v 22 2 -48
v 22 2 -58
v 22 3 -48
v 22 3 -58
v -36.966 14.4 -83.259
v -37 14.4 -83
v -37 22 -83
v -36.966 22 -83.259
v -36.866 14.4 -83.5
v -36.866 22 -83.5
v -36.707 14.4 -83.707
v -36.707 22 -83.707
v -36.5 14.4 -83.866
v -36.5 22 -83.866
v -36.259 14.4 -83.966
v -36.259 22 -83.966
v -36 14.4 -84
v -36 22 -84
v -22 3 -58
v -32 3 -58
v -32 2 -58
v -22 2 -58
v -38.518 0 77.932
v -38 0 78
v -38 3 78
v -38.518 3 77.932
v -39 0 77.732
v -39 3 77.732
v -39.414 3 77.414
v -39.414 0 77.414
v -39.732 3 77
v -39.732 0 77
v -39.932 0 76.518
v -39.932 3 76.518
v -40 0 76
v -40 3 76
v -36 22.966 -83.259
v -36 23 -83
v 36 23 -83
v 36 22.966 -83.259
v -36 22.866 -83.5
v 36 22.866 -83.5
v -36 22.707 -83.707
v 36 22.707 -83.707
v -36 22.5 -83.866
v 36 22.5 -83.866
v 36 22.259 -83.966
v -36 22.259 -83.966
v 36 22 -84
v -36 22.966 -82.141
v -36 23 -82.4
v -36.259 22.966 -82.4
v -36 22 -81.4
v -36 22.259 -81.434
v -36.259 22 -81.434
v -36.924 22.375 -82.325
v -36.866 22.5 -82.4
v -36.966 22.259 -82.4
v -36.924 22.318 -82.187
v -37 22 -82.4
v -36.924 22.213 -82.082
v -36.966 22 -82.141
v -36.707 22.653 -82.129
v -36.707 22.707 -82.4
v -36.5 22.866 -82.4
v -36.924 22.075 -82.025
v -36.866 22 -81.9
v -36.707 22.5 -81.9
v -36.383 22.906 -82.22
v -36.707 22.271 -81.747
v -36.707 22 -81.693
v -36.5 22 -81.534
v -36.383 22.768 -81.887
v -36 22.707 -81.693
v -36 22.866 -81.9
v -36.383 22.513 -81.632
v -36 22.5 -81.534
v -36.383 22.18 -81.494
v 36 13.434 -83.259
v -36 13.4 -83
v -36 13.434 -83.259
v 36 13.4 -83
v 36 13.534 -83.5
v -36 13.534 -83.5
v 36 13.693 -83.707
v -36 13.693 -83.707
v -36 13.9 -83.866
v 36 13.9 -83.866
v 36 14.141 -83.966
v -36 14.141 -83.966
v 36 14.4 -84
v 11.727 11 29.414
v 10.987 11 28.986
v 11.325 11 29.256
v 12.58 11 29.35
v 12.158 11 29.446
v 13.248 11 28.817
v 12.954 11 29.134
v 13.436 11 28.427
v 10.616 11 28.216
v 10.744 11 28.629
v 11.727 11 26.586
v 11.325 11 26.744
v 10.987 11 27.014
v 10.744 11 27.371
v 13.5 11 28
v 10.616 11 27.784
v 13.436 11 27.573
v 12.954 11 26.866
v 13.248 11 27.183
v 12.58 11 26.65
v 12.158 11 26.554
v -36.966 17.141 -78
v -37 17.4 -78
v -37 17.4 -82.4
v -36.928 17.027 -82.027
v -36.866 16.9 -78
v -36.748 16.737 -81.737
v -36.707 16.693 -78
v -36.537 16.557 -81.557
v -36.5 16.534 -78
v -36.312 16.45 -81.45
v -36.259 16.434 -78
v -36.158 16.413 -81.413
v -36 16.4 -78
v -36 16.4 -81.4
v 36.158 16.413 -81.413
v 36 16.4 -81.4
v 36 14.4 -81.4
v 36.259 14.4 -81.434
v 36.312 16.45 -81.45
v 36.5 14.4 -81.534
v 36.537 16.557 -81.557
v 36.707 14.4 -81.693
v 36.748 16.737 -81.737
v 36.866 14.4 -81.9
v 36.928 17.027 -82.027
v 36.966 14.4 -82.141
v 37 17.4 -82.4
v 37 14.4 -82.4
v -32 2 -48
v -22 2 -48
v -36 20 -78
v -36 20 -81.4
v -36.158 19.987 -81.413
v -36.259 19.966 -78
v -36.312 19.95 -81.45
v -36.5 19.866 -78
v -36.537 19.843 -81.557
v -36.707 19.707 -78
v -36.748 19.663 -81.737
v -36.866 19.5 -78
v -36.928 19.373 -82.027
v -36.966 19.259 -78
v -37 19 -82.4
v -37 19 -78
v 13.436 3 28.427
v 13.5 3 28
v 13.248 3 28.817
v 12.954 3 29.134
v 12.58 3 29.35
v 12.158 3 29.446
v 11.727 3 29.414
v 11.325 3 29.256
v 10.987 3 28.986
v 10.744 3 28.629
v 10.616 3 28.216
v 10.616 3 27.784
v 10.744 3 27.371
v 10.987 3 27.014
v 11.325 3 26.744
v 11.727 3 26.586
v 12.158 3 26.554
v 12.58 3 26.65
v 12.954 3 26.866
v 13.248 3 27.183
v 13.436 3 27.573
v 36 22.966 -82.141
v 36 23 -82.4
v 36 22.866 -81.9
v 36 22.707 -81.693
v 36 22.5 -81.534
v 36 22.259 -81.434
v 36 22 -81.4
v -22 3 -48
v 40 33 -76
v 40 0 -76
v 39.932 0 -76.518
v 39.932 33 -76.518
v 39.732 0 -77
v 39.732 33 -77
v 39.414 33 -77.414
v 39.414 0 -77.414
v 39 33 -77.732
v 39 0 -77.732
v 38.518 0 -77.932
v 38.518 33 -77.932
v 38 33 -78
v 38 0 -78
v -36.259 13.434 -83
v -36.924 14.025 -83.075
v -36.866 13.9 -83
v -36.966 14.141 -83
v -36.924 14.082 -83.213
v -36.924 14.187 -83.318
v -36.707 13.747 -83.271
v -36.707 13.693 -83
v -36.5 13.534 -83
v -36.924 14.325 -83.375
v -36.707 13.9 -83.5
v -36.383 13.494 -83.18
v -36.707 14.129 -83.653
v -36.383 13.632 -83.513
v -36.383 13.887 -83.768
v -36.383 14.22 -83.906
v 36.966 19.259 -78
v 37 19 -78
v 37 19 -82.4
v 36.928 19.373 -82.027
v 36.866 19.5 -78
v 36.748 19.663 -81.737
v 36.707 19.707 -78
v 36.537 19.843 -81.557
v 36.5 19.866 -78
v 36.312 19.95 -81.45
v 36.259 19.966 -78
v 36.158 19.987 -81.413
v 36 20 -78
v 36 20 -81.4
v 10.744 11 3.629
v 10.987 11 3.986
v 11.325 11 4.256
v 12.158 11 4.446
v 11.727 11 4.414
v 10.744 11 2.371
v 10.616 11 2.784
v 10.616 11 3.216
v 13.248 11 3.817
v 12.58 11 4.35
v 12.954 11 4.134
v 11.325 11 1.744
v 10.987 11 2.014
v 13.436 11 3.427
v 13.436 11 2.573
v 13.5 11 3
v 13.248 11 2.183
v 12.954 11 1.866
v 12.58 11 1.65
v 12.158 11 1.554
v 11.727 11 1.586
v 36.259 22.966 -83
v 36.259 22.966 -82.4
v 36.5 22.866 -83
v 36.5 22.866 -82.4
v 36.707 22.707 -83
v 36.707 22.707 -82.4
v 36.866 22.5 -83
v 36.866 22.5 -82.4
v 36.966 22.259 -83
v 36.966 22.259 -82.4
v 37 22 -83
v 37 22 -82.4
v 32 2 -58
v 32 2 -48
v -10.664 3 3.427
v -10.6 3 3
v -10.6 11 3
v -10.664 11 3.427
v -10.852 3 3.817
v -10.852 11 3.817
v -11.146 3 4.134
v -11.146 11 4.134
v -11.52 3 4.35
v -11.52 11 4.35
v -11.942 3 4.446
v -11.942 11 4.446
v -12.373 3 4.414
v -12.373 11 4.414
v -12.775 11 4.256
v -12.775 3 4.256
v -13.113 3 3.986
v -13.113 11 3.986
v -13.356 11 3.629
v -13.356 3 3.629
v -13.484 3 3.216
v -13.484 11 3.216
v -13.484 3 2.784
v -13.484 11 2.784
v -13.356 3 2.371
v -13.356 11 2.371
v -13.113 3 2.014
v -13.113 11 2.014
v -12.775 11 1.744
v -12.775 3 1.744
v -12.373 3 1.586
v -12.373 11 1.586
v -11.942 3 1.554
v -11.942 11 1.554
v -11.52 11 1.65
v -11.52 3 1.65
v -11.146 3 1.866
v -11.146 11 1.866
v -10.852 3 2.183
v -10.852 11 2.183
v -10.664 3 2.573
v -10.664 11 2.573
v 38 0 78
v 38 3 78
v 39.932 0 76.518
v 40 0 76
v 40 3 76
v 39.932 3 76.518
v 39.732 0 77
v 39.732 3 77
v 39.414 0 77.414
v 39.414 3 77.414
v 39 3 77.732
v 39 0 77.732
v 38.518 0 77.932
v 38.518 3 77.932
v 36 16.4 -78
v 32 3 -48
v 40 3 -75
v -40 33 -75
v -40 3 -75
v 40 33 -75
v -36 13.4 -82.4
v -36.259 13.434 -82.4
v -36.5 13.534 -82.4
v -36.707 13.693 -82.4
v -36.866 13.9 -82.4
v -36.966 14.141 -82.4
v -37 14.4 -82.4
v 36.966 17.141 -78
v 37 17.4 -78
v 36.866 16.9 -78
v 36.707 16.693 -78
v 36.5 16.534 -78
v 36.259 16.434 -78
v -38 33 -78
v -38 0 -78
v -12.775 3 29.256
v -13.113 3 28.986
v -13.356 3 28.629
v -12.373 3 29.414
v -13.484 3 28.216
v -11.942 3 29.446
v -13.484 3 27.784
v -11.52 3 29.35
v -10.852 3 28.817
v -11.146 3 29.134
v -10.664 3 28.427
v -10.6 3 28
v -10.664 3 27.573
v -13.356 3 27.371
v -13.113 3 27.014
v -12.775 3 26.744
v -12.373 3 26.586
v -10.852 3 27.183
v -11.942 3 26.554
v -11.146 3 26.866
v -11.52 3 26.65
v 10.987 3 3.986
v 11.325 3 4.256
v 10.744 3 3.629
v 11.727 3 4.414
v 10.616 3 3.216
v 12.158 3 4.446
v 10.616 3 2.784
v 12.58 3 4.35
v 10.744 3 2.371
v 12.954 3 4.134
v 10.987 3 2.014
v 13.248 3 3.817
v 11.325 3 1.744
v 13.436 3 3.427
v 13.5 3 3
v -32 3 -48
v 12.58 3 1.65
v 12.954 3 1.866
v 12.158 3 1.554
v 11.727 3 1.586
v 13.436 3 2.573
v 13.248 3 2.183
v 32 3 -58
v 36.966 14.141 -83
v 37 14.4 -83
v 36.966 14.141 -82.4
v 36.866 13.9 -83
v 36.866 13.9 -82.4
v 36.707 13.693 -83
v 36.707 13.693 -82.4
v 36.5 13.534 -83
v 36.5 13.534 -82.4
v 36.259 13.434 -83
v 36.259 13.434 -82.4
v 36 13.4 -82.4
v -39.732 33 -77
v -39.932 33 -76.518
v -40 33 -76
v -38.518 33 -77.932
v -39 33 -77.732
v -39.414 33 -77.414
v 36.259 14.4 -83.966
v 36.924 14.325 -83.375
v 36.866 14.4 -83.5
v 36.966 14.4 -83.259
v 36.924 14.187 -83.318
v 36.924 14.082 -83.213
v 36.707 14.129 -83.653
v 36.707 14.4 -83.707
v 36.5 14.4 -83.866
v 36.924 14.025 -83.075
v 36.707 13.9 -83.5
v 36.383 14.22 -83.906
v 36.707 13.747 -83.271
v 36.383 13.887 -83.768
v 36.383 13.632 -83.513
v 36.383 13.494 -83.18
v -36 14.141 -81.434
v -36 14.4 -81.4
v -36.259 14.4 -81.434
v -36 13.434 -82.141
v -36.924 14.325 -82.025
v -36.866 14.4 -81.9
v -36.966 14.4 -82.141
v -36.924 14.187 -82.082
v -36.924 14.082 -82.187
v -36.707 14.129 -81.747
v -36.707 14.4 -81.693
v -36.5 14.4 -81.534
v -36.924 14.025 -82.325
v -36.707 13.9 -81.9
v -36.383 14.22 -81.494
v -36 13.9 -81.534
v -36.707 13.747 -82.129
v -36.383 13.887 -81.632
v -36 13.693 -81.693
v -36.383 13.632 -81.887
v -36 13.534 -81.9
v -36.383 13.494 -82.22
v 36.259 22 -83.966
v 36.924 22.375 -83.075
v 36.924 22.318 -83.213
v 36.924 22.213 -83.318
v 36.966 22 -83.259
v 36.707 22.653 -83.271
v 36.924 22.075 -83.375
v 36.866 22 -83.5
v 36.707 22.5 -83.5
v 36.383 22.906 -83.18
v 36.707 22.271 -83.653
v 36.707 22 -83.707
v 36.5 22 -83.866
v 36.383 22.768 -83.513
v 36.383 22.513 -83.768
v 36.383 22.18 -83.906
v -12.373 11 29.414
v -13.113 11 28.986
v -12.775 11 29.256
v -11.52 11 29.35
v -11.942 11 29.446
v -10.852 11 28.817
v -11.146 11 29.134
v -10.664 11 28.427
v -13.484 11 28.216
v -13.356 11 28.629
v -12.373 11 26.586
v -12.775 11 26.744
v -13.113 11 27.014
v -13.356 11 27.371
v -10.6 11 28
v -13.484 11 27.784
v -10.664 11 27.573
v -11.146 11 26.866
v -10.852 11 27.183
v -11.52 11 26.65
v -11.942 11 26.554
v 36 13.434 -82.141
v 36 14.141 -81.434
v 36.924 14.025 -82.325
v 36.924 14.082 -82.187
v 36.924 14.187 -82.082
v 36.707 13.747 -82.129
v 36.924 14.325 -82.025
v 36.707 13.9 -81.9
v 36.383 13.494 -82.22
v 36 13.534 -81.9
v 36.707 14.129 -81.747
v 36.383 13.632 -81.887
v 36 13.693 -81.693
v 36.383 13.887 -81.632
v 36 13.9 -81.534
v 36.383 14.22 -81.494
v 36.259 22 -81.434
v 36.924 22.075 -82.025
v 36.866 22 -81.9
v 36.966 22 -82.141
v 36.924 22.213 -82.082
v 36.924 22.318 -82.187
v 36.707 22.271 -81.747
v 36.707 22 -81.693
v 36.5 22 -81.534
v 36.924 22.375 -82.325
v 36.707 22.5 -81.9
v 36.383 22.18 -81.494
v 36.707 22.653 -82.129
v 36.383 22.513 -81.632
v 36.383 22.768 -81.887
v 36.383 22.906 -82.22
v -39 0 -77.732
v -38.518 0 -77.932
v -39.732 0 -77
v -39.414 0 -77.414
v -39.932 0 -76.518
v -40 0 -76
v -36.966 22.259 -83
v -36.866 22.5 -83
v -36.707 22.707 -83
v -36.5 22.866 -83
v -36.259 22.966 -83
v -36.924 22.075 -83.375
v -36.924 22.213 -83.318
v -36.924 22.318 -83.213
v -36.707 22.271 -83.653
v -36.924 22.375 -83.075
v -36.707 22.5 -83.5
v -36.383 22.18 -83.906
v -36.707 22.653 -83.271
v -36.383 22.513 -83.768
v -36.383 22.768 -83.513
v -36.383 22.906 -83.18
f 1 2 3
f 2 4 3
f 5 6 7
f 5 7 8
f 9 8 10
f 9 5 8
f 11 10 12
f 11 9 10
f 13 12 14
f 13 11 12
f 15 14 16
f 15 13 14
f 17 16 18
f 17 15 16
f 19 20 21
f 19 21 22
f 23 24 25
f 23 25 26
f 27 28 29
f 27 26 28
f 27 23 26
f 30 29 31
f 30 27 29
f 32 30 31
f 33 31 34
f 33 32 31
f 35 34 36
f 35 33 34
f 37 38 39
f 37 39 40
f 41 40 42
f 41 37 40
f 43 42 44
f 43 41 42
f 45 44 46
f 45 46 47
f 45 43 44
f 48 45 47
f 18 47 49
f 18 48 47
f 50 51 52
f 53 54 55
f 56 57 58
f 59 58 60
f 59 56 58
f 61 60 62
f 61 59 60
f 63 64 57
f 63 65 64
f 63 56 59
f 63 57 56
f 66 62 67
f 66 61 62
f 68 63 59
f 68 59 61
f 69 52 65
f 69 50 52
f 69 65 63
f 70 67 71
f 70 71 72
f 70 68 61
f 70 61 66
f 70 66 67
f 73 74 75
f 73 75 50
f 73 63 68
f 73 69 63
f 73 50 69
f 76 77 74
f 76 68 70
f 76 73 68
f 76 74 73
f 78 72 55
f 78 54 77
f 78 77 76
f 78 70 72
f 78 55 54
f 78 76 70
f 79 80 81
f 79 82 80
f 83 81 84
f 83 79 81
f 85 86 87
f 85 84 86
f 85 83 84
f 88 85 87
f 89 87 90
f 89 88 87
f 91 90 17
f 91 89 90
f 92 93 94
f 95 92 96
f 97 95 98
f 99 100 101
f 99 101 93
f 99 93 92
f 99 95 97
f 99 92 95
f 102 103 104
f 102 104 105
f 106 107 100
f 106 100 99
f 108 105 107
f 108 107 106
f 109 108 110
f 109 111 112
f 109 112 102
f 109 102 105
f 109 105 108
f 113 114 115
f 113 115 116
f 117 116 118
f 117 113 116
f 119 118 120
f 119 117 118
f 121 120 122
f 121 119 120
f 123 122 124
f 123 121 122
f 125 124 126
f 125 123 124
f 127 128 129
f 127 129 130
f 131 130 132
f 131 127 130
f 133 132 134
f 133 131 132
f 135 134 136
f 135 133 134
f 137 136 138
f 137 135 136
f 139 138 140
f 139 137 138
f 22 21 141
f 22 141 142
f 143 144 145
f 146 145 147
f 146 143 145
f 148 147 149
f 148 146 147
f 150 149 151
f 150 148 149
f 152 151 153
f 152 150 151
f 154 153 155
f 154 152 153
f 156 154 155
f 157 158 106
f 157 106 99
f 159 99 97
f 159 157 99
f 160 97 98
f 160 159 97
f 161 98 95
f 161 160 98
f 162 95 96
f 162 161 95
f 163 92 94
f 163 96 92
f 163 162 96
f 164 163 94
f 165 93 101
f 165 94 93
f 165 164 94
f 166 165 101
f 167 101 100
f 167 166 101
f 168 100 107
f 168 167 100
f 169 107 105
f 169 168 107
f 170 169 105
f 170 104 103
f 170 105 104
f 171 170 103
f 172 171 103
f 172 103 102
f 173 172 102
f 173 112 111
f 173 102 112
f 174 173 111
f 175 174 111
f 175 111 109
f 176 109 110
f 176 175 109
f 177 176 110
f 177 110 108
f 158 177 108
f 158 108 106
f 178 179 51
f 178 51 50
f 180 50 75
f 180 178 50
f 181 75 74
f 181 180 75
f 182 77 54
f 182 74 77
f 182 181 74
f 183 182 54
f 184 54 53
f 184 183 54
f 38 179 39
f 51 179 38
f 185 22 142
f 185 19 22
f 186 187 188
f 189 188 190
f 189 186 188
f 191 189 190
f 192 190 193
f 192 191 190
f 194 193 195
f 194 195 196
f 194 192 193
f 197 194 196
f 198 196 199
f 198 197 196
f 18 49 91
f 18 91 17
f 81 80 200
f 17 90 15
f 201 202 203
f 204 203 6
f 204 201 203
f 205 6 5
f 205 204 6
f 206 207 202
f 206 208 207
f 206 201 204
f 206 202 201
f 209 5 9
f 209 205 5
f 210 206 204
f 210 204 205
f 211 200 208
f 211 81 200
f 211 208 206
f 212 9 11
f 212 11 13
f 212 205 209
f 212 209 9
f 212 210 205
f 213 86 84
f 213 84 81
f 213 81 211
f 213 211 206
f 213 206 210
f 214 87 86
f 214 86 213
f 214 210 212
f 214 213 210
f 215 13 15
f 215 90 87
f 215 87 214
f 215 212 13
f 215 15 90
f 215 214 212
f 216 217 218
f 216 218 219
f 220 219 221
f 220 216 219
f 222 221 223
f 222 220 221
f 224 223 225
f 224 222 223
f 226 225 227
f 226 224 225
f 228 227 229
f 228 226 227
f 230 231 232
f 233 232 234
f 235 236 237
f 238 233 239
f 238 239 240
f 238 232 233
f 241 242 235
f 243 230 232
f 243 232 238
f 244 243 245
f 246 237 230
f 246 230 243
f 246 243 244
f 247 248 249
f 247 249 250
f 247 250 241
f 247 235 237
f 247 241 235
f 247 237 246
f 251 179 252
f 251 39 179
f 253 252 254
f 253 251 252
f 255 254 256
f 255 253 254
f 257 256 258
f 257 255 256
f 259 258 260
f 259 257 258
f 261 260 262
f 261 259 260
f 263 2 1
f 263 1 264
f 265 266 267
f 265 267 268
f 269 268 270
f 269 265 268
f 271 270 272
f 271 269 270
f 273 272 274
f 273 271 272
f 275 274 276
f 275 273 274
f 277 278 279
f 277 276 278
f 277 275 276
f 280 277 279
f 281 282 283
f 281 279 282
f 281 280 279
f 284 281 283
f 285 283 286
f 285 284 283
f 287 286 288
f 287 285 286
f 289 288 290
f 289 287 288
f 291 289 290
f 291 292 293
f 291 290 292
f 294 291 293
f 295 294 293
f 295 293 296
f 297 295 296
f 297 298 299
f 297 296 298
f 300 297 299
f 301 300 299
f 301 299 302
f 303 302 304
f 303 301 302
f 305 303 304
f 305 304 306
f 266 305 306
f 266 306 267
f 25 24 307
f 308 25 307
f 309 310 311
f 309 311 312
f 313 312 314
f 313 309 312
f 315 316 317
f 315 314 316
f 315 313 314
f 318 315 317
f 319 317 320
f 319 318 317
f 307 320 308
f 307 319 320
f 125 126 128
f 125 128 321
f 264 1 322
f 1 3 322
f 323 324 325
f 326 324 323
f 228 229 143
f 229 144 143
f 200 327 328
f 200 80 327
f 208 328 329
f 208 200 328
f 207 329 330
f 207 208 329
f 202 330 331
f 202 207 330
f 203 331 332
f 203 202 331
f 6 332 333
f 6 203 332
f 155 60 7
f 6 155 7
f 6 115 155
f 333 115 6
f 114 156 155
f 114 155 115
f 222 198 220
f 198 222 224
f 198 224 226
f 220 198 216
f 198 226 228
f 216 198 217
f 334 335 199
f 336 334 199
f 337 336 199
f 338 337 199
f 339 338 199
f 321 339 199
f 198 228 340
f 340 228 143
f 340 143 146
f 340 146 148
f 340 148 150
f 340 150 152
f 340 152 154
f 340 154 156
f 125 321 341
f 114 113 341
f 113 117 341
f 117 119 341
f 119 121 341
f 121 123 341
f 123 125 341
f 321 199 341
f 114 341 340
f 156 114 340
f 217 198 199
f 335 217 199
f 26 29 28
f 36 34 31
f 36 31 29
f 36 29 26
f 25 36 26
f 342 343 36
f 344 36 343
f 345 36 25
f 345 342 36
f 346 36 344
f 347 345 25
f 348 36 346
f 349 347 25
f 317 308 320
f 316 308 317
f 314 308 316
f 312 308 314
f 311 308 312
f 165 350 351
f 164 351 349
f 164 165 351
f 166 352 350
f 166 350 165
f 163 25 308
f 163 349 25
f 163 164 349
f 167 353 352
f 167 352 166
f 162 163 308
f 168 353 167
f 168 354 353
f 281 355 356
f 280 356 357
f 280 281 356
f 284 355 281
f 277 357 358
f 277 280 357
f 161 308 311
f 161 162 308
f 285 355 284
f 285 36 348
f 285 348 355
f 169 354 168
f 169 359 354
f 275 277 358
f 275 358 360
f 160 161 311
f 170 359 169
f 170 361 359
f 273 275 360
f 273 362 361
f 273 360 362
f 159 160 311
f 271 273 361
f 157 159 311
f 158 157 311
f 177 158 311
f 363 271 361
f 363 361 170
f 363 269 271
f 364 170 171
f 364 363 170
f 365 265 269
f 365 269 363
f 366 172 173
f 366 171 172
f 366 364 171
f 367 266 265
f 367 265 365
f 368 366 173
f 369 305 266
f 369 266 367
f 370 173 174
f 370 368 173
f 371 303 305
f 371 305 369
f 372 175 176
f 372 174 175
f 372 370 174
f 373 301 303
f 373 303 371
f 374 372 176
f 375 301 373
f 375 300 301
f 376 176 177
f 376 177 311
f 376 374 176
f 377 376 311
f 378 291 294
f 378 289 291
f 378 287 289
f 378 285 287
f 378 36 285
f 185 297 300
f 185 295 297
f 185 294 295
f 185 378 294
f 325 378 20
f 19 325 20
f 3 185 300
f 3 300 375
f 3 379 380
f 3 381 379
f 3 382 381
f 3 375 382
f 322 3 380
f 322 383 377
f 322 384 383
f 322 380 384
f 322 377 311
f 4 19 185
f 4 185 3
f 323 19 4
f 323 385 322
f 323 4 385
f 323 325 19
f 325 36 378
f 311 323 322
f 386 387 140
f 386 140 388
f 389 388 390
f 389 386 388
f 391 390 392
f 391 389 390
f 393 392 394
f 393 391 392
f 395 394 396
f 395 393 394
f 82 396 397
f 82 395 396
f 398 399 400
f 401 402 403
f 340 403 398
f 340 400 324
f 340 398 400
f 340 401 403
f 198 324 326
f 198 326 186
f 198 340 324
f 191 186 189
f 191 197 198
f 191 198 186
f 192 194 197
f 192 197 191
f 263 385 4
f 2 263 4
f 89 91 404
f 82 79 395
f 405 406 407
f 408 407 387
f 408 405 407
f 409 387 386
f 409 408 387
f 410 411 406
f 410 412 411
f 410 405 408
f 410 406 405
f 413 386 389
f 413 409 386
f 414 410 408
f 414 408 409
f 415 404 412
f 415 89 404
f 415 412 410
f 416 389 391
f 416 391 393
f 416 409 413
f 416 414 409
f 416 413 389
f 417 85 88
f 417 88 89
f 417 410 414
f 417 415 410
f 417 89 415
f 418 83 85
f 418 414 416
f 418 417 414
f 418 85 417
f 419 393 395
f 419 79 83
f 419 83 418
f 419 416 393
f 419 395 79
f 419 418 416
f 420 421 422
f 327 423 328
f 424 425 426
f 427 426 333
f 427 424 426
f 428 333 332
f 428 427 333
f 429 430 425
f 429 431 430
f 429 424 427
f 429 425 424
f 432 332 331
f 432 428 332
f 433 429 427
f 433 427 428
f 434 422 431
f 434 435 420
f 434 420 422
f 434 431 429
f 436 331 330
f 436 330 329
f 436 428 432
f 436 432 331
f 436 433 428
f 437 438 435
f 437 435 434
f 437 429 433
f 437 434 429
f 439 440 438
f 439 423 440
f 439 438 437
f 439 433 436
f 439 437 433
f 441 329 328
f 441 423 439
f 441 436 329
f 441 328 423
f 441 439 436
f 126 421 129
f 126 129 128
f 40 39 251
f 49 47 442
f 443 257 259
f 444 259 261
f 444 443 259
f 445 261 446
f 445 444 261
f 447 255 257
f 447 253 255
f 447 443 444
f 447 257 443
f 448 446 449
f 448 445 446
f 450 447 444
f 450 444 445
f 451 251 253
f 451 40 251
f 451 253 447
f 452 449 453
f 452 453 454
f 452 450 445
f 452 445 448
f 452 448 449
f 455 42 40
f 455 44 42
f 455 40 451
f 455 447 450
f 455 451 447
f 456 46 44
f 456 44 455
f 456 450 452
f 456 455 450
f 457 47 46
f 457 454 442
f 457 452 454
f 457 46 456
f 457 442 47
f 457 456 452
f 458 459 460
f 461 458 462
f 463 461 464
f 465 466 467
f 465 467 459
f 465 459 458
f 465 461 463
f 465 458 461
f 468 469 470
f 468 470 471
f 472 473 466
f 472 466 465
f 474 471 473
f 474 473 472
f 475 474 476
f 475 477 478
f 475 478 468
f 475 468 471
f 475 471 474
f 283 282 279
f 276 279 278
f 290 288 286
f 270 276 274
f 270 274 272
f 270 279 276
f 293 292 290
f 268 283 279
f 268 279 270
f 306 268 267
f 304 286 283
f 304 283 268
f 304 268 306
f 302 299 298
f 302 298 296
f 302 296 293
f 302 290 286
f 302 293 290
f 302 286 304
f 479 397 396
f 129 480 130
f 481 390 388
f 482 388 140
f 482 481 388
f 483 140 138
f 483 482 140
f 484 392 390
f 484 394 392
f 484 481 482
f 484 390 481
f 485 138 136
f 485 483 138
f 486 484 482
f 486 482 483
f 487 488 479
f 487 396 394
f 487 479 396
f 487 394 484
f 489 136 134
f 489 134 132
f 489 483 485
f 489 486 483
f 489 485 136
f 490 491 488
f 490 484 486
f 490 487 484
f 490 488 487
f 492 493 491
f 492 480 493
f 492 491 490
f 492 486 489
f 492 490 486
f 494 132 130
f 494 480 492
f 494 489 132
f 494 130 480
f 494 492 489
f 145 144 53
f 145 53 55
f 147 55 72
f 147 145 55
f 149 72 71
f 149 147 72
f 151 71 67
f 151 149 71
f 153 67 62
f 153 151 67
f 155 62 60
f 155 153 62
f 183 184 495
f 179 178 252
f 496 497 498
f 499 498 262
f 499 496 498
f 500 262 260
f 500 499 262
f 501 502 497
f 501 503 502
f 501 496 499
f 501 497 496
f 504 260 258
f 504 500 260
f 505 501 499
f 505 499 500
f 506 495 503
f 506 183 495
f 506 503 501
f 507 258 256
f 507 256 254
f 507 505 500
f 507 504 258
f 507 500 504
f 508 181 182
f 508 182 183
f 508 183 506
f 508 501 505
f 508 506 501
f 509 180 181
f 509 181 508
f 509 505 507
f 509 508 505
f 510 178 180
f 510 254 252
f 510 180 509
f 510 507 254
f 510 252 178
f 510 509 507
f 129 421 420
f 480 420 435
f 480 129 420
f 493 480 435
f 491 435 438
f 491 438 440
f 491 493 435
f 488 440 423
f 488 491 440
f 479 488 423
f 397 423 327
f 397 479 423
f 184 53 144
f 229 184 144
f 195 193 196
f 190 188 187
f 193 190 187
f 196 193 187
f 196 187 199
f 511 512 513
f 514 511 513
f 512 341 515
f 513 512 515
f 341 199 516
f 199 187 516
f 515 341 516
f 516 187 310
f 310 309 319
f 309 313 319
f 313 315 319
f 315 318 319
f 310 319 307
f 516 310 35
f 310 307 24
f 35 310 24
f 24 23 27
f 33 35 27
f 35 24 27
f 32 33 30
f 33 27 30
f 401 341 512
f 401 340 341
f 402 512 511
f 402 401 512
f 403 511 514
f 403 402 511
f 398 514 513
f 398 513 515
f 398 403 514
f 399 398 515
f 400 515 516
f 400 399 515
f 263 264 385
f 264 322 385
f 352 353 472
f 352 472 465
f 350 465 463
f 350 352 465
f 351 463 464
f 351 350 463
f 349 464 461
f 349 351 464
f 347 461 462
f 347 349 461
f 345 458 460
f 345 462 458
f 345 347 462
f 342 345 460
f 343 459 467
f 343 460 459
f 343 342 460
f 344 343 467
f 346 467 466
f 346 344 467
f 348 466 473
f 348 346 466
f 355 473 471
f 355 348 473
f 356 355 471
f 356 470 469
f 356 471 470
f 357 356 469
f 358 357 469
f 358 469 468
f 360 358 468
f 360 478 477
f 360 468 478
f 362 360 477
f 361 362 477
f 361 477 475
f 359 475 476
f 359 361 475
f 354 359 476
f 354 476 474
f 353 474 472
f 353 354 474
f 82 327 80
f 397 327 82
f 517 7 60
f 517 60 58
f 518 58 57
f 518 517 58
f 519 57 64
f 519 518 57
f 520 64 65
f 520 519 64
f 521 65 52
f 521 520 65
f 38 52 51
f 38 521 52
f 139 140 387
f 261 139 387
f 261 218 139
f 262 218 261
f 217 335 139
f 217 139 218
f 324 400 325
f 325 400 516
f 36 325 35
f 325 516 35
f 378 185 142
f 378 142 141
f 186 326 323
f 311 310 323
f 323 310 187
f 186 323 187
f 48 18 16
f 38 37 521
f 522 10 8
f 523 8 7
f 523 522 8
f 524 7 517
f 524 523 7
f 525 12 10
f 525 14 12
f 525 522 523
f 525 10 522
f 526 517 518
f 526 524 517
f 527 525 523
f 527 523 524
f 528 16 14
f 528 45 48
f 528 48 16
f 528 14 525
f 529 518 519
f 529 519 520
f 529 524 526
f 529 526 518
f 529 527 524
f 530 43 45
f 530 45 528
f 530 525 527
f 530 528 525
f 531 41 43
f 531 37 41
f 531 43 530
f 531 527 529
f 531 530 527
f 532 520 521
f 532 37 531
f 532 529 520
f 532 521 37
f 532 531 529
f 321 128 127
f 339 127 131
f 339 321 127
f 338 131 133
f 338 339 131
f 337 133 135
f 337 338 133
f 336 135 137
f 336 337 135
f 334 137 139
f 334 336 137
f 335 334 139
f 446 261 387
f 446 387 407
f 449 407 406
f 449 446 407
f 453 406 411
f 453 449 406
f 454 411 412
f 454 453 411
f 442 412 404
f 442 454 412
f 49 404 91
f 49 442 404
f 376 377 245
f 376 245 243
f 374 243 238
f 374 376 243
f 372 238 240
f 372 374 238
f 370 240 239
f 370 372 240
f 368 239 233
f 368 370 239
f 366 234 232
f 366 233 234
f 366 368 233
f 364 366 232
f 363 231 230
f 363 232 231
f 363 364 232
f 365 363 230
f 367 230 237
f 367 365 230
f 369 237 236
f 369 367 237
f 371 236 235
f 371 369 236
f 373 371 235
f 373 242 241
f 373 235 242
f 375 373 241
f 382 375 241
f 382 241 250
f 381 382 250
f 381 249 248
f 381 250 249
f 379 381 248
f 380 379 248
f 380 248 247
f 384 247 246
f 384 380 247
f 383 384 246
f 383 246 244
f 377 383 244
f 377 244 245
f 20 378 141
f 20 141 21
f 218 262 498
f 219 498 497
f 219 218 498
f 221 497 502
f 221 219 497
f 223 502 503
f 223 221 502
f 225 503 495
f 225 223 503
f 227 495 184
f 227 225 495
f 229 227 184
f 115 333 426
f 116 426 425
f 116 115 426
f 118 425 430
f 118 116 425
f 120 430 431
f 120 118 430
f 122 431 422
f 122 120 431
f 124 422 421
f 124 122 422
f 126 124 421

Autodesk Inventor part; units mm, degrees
ref_plane "YZ Plane" through (0, 0, 0) normal (1, 0, 0) x (0, 1, 0)
ref_plane "XZ Plane" through (0, 0, 0) normal (0, 1, 0) x (-1, 0, 0)
ref_plane "XY Plane" through (0, 0, 0) normal (0, 0, 1) x (1, 0, 0)
sketch "Sketch1" plane through (0, 0, 0) normal (0, 1, 0) x (-1, 0, 0)
  line L0 (-40, -78) -> (40, -78)
  line L1 (40, -78) -> (40, 78)
  line L2 (40, 78) -> (-40, 78)
  line L3 (-40, 78) -> (-40, -78)
  line L4 (-40, -78) -> (40, 78) construction
  line L5 (40, -78) -> (-40, 78) construction
  point P0 (0, 0)
  dimension "d0" = 80
  dimension "d1" = 156
extrude "Extrusion1" add sketch "Sketch1" along normal blind 3
sketch "Sketch2" plane through (0, 3, 0) normal (0, 1, 0) x (1, 0, 0)
  line L0 (-40, 78) -> (-40, -78) projected
  line L1 (-40, -78) -> (40, -78) projected
  line L2 (40, -78) -> (40, 78) projected
  line L3 (40, 78) -> (-40, 78) projected
  line L4 (40, 78) -> (-40, 78)
  line L5 (-40, 78) -> (-40, -78)
  line L6 (-40, -78) -> (40, -78)
  line L7 (40, -78) -> (40, 78)
  line L8 (40, 78) -> (-40, -78) construction
  line L9 (-40, 78) -> (40, -78) construction
  line L10 (37, 75) -> (-37, 75)
  line L11 (-37, 75) -> (-37, -75)
  line L12 (-37, -75) -> (37, -75)
  line L13 (37, -75) -> (37, 75)
  line L14 (37, 75) -> (-37, -75) construction
  line L15 (-37, 75) -> (37, -75) construction
  point P0 (0, 0)
  dimension "d4" = 0
  dimension "d5" = 0
  dimension "d6" = 3
  dimension "d7" = 3
extrude "Extrusion2" add sketch "Sketch2" along normal blind 30
fillet "Fillet1" radius 2 4 edges at (40, 16.5, 78) (40, 16.5, -78) (-40, 16.5, 78) (-40, 16.5, -78)
sketch "Sketch13" plane through (23.2, 5, -78) normal (0, 0, -1) x (-1, 0, 0)
  line L0 (-13.8, 18) -> (60.2, 18)
  line L1 (60.2, 18) -> (60.2, 8.4)
  line L2 (60.2, 8.4) -> (-13.8, 8.4)
  line L3 (-13.8, 8.4) -> (-13.8, 18)
  line L4 (63.2, -5) -> (63.2, 28) projected
  line L5 (-16.8, 28) -> (-16.8, -5) projected
  line L6 (-14.8, -5) -> (61.2, -5) projected
  point P0 (23.2, -5)
  point P1 (51.4, 0)
  point P2 (-5, 0)
  point P3 (-16.8, -5)
  point P4 (63.2, 11.5)
  point P5 (60.2, 13.2)
  dimension "d131" = 9.6
  dimension "d146" = 3
  dimension "d147" = 3
  dimension "d156" = 23
extrude "Extrusion13" add sketch "Sketch13" along normal blind 6
sketch "Sketch14" plane through (-37, 13.4, -78) normal (-1, 0, 0) x (0, 0, 1)
  line L0 (0, 9.6) -> (0, 0) projected
  line L1 (0, 9.6) -> (-6, 9.6) projected
  line L2 (-6, 0) -> (-6, 9.6) projected
  line L3 (0, 0) -> (-6, 0) projected
  line L4 (0, 9.6) -> (-3.4, 9.6)
  line L5 (-3.4, 9.6) -> (-3.4, 6.6)
  line L6 (-3.4, 6.6) -> (0, 6.6)
  line L7 (0, 6.6) -> (0, 9.6)
  line L8 (0, 0) -> (-3.4, 0)
  line L9 (-3.4, 0) -> (-3.4, 3)
  line L10 (-3.4, 3) -> (0, 3)
  line L11 (0, 3) -> (0, 0)
  point P0 (78, -13.4)
  point P1 (0, 6.6)
  dimension "d137" = 3.4
  dimension "d138" = 3
  dimension "d139" = 3.4
  dimension "d140" = 3
extrude "Extrusion14" cut sketch "Sketch14" against normal up to surface (74 mm away) contours L0 L6 L5 L1 | L0 L3 L9 L10
fillet "Fillet5" radius 1 18 edges at (0, 23, -84) (0, 23, -81.4) (0, 13.4, -84) (0, 13.4, -81.4) (-37, 16.4, -79.7) (-37, 20, -79.7) (37, 16.4, -79.7) (37, 20, -79.7) (-37, 18.2, -84) (-37, 21.5, -81.4) (-37, 14.9, -81.4) (-37, 23, -82.7) (-37, 13.4, -82.7) (37, 23, -82.7) (37, 13.4, -82.7) (37, 14.9, -81.4) (37, 18.2, -84) (37, 21.5, -81.4)
sketch "Sketch16" plane through (0, 33, 0) normal (0, 1, 0) x (1, 0, 0)
  arc A0 (-38, 78) -> (-40, 76) centre (-38, 76) ccw projected
  line L0 (-40, 76) -> (-40, -76) projected
  arc A1 (-40, -76) -> (-38, -78) centre (-38, -76) ccw projected
  line L1 (-38, -78) -> (38, -78) projected
  arc A2 (38, -78) -> (40, -76) centre (38, -76) ccw projected
  line L2 (40, -76) -> (40, 76) projected
  arc A3 (40, 76) -> (38, 78) centre (38, 76) ccw projected
  line L3 (38, 78) -> (-38, 78) projected
  line L4 (37, 75) -> (37, -75) projected
  line L5 (37, -75) -> (-37, -75) projected
  line L6 (-37, -75) -> (-37, 75) projected
  line L7 (-37, 75) -> (37, 75) projected
  line L8 (-37, 75) -> (-40, 75)
  line L9 (37, 75) -> (40, 75)
  circle A4 centre (38, 76) radius 2
  circle A5 centre (-38, 76) radius 2
  point P0 (0, 0)
  point P1 (-39.7321, 75)
  point P2 (40, 76)
  point P3 (39.7321, 75)
  dimension "d180" = 4
  dimension "d181" = 4
extrude "Extrusion16" cut sketch "Sketch16" against normal blind 30 contours L8 A5 L6 L5 L4 A4 L9 L2 A2 L1 A1 L0 | L8 L6 A5 | A4 L4 L9
sketch "Sketch18" plane through (0, 3, 0) normal (0, 1, 0) x (1, 0, 0)
  line L0 (40, 75) -> (-40, 75) projected
  line L1 (38, -78) -> (-38, -78) projected
  line L2 (40, 75) -> (40, -76) projected
  line L3 (32, 58) -> (22, 58)
  line L4 (22, 58) -> (22, 48)
  line L5 (22, 48) -> (32, 48)
  line L6 (32, 48) -> (32, 58)
  line L7 (-22, 48) -> (-32, 48)
  line L8 (-32, 48) -> (-32, 58)
  line L9 (-32, 58) -> (-22, 58)
  line L10 (-22, 58) -> (-22, 48)
  line L11 (38, 78) -> (-38, 78) projected
  line L12 (-40, -76) -> (-40, 75) projected
  arc A0 (-40, -76) -> (-38, -78) centre (-38, -76) ccw projected
  arc A1 (38, -78) -> (40, -76) centre (38, -76) ccw projected
  dimension "d182" = 10
  dimension "d183" = 10
  dimension "d184" = 8
  dimension "d185" = 10
  dimension "d186" = 10
  dimension "d188" = 20
  dimension "d189" = 20
extrude "Extrusion18" cut sketch "Sketch18" against normal blind 1 contours L6 L5 L4 L3 | L7 L8 L9 L10
sketch "Sketch19" plane through (0, 3, 0) normal (0, 1, 0) x (1, 0, 0)
  line L0 (40, 75) -> (40, -76) projected
  line L1 (38, -78) -> (-38, -78) projected
  line L2 (-40, -76) -> (-40, 76) projected
  circle A0 centre (-12.05, -3) radius 1.45
  circle A1 centre (-12.05, -28) radius 1.45
  circle A2 centre (12.05, -3) radius 1.45
  circle A3 centre (12.05, -28) radius 1.45
  line L3 (-5, -54) -> (5, -54) projected
  line L4 (32, 58) -> (32, 48) projected
  line L5 (-32, 48) -> (-32, 58) projected
  point P0 (40, 76)
  point P1 (0, -54)
  point P2 (0, -54)
  point P3 (32, 53)
  point P4 (-32, 53)
  dimension "d215" = 2.9
  dimension "d216" = 2.9
  dimension "d217" = 2.9
  dimension "d218" = 2.9
  dimension "d219" = 25
  dimension "d220" = 25
  dimension "d221" = 24.1
  dimension "d222" = 12.05
  dimension "d223" = 12.05
  dimension "d224" = 56
  dimension "d225" = 56
extrude "Extrusion19" add sketch "Sketch19" along normal blind 8
properties part number "module_command" material "PC/ABS Plastic"
